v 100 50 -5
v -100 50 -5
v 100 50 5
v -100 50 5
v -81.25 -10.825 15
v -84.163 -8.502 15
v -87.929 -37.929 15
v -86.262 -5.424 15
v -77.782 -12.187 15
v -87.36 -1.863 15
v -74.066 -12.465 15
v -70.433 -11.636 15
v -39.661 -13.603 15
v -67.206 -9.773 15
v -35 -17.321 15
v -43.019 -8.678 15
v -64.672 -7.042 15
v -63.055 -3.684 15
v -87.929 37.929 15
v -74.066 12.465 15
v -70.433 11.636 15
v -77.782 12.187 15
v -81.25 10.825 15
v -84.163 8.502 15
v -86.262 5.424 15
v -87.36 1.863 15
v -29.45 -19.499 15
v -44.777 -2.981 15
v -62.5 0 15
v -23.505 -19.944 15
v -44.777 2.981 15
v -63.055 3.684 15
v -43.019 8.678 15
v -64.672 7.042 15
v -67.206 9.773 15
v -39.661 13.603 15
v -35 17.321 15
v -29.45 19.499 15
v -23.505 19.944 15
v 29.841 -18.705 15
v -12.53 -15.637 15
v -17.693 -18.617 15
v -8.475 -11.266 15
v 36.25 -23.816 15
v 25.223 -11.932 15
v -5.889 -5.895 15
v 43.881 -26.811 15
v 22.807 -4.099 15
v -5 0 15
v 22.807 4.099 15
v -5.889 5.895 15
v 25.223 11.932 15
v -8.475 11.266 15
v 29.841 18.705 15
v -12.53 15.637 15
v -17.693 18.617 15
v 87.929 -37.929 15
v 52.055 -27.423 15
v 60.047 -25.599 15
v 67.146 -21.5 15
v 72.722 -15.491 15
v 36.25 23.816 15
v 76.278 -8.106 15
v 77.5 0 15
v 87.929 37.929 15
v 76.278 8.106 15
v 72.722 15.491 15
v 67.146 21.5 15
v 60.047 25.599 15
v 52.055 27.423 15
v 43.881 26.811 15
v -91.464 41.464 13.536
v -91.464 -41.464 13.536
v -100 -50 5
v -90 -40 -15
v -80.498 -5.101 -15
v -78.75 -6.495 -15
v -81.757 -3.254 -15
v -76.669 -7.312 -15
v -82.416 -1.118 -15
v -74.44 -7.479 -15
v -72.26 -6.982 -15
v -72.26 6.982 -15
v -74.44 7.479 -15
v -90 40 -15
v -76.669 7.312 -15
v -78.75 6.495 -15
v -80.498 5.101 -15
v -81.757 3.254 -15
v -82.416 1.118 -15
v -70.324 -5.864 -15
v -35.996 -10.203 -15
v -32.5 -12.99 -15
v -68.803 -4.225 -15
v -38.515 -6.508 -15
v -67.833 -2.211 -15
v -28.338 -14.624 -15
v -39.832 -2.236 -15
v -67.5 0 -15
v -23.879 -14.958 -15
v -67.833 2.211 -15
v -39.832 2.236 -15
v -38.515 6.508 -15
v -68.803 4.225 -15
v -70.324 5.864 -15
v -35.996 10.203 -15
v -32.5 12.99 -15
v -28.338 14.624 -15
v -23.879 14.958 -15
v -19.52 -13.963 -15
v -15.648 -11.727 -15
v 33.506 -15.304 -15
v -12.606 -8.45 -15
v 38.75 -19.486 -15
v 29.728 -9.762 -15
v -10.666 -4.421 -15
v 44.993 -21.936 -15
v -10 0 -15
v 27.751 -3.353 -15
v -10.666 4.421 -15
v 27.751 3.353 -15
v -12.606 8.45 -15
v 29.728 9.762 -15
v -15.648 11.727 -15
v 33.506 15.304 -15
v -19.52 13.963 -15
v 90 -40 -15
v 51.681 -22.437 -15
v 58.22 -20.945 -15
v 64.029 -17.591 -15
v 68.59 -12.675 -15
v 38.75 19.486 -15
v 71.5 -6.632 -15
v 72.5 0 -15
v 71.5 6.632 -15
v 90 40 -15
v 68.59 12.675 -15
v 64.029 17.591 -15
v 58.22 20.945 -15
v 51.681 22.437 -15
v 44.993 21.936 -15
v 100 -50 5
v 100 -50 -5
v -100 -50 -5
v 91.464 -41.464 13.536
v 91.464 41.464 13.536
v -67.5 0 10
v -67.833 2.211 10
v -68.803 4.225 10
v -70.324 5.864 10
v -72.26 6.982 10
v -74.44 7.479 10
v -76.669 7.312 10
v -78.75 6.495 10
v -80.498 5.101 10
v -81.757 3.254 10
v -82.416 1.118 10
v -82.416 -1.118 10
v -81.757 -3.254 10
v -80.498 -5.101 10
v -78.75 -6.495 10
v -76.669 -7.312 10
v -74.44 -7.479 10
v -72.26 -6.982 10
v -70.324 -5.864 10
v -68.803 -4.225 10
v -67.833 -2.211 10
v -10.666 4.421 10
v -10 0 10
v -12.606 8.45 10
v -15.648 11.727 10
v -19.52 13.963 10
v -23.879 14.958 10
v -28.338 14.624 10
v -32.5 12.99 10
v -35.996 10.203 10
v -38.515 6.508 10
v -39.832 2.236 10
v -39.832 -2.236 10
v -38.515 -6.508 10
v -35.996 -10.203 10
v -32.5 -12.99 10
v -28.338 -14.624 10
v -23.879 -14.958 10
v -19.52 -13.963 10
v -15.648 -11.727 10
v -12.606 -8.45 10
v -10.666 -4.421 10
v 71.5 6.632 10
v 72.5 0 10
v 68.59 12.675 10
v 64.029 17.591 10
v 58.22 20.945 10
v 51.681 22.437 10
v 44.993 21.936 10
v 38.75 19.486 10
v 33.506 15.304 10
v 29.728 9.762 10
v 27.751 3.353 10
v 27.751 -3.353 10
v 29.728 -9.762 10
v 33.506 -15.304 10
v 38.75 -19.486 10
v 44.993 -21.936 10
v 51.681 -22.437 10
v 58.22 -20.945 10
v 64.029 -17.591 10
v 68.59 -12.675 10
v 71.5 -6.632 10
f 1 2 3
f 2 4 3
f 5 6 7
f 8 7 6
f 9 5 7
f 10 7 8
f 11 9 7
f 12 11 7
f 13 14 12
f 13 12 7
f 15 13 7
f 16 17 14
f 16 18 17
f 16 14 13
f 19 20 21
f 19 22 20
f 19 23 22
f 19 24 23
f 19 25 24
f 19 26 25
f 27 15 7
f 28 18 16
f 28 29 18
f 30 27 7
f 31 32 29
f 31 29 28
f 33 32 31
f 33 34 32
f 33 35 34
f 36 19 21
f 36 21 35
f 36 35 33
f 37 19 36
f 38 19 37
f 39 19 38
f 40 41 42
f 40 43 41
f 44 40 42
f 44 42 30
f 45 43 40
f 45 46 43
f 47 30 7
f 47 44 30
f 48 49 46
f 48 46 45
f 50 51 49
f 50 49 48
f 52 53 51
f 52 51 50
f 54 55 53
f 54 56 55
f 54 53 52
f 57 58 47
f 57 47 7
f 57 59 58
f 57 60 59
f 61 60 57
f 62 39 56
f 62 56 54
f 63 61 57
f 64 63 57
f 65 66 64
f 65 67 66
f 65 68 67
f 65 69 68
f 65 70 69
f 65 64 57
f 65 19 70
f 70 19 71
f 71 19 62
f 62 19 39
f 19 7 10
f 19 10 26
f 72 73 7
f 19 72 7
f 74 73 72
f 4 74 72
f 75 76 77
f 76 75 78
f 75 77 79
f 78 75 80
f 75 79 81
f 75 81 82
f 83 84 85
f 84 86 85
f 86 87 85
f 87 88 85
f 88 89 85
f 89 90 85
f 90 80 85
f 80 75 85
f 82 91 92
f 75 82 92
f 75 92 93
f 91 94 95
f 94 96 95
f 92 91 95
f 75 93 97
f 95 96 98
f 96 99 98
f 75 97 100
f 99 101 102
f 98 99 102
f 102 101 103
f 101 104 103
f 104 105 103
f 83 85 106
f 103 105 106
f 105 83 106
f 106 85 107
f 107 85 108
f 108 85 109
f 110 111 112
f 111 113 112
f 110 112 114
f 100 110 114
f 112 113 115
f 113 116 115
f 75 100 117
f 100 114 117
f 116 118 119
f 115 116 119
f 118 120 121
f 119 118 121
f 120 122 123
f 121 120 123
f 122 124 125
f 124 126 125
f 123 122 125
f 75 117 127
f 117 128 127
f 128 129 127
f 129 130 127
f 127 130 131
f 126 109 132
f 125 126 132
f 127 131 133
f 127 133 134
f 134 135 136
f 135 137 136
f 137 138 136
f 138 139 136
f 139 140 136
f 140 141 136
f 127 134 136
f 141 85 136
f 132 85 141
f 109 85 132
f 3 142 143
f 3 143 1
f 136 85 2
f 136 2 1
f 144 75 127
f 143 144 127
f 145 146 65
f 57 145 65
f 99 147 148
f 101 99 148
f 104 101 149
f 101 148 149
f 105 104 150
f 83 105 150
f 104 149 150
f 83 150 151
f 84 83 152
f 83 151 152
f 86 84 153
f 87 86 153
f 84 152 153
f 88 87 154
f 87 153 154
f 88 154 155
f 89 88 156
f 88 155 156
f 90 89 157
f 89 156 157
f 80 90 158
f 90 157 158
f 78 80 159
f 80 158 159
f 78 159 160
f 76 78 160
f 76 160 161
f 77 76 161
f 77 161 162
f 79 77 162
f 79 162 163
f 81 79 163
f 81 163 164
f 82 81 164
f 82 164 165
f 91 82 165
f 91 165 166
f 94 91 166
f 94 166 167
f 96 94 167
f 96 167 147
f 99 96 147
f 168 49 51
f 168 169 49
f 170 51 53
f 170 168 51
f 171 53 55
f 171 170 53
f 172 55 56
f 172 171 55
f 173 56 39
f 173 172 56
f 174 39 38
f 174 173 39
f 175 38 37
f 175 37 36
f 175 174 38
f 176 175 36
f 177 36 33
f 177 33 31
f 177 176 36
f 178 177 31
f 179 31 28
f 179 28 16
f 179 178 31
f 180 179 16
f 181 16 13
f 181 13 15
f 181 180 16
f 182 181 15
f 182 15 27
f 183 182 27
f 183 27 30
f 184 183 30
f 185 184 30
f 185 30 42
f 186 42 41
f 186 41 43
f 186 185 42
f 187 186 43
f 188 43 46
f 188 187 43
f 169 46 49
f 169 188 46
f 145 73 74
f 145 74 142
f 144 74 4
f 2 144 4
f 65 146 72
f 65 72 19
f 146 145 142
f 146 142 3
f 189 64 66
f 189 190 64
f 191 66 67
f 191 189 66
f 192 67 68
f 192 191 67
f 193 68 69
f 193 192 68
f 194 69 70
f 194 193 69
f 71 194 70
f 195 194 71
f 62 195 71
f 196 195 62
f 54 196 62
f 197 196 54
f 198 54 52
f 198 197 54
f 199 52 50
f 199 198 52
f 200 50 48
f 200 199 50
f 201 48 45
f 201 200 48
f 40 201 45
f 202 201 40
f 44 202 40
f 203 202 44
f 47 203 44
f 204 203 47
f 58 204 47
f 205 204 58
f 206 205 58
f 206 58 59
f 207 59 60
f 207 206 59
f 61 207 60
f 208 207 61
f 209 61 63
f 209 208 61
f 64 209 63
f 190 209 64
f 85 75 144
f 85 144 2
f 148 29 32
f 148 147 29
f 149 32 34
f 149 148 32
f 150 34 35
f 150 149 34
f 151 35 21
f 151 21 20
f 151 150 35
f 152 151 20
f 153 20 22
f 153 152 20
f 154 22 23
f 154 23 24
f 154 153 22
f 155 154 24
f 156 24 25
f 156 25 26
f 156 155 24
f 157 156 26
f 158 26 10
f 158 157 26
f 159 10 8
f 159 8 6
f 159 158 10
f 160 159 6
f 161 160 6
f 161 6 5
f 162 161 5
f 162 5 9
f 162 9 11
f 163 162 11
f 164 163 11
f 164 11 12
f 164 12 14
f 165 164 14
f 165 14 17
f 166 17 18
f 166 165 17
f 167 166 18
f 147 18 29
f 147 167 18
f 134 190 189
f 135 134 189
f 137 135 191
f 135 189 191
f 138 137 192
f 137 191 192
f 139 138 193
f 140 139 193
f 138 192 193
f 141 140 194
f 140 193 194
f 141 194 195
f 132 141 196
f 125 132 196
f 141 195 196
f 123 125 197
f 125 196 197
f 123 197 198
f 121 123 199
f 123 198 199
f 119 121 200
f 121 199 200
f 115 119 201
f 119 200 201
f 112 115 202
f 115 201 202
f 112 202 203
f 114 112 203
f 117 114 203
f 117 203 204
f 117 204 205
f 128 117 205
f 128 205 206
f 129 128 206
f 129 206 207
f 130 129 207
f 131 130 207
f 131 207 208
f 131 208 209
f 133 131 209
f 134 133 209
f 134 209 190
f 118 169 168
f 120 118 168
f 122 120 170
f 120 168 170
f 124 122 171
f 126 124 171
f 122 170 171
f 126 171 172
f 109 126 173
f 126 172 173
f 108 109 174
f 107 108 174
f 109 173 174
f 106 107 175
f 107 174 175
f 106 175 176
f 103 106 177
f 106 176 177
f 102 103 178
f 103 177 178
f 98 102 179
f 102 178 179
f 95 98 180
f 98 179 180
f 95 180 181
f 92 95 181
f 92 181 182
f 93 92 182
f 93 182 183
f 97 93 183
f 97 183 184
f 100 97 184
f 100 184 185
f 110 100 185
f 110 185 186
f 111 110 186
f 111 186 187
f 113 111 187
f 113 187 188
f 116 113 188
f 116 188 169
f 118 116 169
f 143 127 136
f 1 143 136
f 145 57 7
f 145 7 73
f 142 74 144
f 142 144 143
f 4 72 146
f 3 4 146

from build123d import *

# Parameters (mm, degrees)
F0_W        = 200
F0_H        = 100
F1_DEPTH    = 15
F2_C1_SIZE  = 10
F2_C2_SIZE  = 10
F2_C3_SIZE  = 10
F2_C4_SIZE  = 10
F2_C5_SIZE  = 10
F2_C6_SIZE  = 10
F2_C7_SIZE  = 10
F2_C8_SIZE  = 10
F3_R        = 15
F3_R_2      = 7.5
F3_R_3      = 22.5
F4_DEPTH    = 30.001
F5_T1_DEPTH = 91.2857086021
F5_T3_DEPTH = 191.2857086021


# Not quite as in the source:
# - a fillet or chamfer that OpenCascade refuses, or shapes differently, is made with other operations: its cross-section is extruded or revolved along the edge and cut away or added


with BuildPart() as f1:
    # F0 (on Top) → F1 (new body, symmetric)
    with BuildSketch(Plane.XY):
        Rectangle(F0_W, F0_H)
    extrude(amount=F1_DEPTH, both=True)

    # F2: chamfer of 10 on 8 edges, made by hand

    # F2_c1
    f2_c1_edges = [f1.edges().sort_by_distance(p)[0] for p in [
        (100, 0, -15),
    ]]
    chamfer(f2_c1_edges, length=F2_C1_SIZE)

    # F2_c2
    f2_c2_edges = [f1.edges().sort_by_distance(p)[0] for p in [
        (100, 0, 15),
    ]]
    chamfer(f2_c2_edges, length=F2_C2_SIZE)

    # F2_c3
    f2_c3_edges = [f1.edges().sort_by_distance(p)[0] for p in [
        (-5, -50, -15),
    ]]
    chamfer(f2_c3_edges, length=F2_C3_SIZE)

    # F2_c4
    f2_c4_edges = [f1.edges().sort_by_distance(p)[0] for p in [
        (-5, -50, 15),
    ]]
    chamfer(f2_c4_edges, length=F2_C4_SIZE)

    # F2_c5
    f2_c5_edges = [f1.edges().sort_by_distance(p)[0] for p in [
        (-100, 5, -15),
    ]]
    chamfer(f2_c5_edges, length=F2_C5_SIZE)

    # F2_c6
    f2_c6_edges = [f1.edges().sort_by_distance(p)[0] for p in [
        (-100, 5, 15),
    ]]
    chamfer(f2_c6_edges, length=F2_C6_SIZE)

    # F2_c7
    f2_c7_edges = [f1.edges().sort_by_distance(p)[0] for p in [
        (0, 50, 15),
    ]]
    chamfer(f2_c7_edges, length=F2_C7_SIZE)

    # F2_c8
    f2_c8_edges = [f1.edges().sort_by_distance(p)[0] for p in [
        (0, 50, -15),
    ]]
    chamfer(f2_c8_edges, length=F2_C8_SIZE)

    # F3 (on face) → F4 (cut, through all)
    with BuildSketch(Plane.XY.offset(15)):
        with Locations((-25, 0)):
            Circle(F3_R)
        with Locations((-75, 0)):
            Circle(F3_R_2)
        with Locations((50, 0)):
            Circle(F3_R_3)
    extrude(amount=-F4_DEPTH, mode=Mode.SUBTRACT)

    # F5: chamfer of 5 on 7 edges, made by hand

    # F5_s2 → F5_t1 (cut)
    with BuildSketch(Plane.XZ.offset(-45.6428543011)):
        Polygon((-91.4644660941, 13.5355339059), (-87.9289321881, 15), (-90, 15), align=None)
        Polygon((91.4644660941, 13.5355339059), (87.9289321881, 15), (90, 15), align=None)
    extrude(amount=F5_T1_DEPTH, mode=Mode.SUBTRACT)

    # F5_s4 → F5_t3 (cut)
    with BuildSketch(Plane.YZ.offset(-95.6428543011)):
        Polygon((41.4644660941, 13.5355339059), (37.9289321881, 15), (40, 15), align=None)
        Polygon((-37.9289321881, 15), (-41.4644660941, 13.5355339059), (-40, 15), align=None)
    extrude(amount=F5_T3_DEPTH, mode=Mode.SUBTRACT)

    # F5_s5 → F5_t6 (revolve, cut)
    with BuildSketch(Plane.XZ):
        Polygon((77.5, 15), (72.5, 10), (72.5, 15), align=None)
    revolve(axis=Axis((50, 0, 15), (0, 0, 1)), mode=Mode.SUBTRACT)

    # F5_s7 → F5_t8 (revolve, cut)
    with BuildSketch(Plane.XZ):
        Polygon((-5, 15), (-10, 10), (-10, 15), align=None)
    revolve(axis=Axis((-25, 0, 15), (0, 0, 1)), mode=Mode.SUBTRACT)

    # F5_s9 → F5_t10 (revolve, cut)
    with BuildSketch(Plane.XZ):
        Polygon((-62.5, 15), (-67.5, 10), (-67.5, 15), align=None)
    revolve(axis=Axis((-75, 0, 15), (0, 0, 1)), mode=Mode.SUBTRACT)


solid = f1.part
